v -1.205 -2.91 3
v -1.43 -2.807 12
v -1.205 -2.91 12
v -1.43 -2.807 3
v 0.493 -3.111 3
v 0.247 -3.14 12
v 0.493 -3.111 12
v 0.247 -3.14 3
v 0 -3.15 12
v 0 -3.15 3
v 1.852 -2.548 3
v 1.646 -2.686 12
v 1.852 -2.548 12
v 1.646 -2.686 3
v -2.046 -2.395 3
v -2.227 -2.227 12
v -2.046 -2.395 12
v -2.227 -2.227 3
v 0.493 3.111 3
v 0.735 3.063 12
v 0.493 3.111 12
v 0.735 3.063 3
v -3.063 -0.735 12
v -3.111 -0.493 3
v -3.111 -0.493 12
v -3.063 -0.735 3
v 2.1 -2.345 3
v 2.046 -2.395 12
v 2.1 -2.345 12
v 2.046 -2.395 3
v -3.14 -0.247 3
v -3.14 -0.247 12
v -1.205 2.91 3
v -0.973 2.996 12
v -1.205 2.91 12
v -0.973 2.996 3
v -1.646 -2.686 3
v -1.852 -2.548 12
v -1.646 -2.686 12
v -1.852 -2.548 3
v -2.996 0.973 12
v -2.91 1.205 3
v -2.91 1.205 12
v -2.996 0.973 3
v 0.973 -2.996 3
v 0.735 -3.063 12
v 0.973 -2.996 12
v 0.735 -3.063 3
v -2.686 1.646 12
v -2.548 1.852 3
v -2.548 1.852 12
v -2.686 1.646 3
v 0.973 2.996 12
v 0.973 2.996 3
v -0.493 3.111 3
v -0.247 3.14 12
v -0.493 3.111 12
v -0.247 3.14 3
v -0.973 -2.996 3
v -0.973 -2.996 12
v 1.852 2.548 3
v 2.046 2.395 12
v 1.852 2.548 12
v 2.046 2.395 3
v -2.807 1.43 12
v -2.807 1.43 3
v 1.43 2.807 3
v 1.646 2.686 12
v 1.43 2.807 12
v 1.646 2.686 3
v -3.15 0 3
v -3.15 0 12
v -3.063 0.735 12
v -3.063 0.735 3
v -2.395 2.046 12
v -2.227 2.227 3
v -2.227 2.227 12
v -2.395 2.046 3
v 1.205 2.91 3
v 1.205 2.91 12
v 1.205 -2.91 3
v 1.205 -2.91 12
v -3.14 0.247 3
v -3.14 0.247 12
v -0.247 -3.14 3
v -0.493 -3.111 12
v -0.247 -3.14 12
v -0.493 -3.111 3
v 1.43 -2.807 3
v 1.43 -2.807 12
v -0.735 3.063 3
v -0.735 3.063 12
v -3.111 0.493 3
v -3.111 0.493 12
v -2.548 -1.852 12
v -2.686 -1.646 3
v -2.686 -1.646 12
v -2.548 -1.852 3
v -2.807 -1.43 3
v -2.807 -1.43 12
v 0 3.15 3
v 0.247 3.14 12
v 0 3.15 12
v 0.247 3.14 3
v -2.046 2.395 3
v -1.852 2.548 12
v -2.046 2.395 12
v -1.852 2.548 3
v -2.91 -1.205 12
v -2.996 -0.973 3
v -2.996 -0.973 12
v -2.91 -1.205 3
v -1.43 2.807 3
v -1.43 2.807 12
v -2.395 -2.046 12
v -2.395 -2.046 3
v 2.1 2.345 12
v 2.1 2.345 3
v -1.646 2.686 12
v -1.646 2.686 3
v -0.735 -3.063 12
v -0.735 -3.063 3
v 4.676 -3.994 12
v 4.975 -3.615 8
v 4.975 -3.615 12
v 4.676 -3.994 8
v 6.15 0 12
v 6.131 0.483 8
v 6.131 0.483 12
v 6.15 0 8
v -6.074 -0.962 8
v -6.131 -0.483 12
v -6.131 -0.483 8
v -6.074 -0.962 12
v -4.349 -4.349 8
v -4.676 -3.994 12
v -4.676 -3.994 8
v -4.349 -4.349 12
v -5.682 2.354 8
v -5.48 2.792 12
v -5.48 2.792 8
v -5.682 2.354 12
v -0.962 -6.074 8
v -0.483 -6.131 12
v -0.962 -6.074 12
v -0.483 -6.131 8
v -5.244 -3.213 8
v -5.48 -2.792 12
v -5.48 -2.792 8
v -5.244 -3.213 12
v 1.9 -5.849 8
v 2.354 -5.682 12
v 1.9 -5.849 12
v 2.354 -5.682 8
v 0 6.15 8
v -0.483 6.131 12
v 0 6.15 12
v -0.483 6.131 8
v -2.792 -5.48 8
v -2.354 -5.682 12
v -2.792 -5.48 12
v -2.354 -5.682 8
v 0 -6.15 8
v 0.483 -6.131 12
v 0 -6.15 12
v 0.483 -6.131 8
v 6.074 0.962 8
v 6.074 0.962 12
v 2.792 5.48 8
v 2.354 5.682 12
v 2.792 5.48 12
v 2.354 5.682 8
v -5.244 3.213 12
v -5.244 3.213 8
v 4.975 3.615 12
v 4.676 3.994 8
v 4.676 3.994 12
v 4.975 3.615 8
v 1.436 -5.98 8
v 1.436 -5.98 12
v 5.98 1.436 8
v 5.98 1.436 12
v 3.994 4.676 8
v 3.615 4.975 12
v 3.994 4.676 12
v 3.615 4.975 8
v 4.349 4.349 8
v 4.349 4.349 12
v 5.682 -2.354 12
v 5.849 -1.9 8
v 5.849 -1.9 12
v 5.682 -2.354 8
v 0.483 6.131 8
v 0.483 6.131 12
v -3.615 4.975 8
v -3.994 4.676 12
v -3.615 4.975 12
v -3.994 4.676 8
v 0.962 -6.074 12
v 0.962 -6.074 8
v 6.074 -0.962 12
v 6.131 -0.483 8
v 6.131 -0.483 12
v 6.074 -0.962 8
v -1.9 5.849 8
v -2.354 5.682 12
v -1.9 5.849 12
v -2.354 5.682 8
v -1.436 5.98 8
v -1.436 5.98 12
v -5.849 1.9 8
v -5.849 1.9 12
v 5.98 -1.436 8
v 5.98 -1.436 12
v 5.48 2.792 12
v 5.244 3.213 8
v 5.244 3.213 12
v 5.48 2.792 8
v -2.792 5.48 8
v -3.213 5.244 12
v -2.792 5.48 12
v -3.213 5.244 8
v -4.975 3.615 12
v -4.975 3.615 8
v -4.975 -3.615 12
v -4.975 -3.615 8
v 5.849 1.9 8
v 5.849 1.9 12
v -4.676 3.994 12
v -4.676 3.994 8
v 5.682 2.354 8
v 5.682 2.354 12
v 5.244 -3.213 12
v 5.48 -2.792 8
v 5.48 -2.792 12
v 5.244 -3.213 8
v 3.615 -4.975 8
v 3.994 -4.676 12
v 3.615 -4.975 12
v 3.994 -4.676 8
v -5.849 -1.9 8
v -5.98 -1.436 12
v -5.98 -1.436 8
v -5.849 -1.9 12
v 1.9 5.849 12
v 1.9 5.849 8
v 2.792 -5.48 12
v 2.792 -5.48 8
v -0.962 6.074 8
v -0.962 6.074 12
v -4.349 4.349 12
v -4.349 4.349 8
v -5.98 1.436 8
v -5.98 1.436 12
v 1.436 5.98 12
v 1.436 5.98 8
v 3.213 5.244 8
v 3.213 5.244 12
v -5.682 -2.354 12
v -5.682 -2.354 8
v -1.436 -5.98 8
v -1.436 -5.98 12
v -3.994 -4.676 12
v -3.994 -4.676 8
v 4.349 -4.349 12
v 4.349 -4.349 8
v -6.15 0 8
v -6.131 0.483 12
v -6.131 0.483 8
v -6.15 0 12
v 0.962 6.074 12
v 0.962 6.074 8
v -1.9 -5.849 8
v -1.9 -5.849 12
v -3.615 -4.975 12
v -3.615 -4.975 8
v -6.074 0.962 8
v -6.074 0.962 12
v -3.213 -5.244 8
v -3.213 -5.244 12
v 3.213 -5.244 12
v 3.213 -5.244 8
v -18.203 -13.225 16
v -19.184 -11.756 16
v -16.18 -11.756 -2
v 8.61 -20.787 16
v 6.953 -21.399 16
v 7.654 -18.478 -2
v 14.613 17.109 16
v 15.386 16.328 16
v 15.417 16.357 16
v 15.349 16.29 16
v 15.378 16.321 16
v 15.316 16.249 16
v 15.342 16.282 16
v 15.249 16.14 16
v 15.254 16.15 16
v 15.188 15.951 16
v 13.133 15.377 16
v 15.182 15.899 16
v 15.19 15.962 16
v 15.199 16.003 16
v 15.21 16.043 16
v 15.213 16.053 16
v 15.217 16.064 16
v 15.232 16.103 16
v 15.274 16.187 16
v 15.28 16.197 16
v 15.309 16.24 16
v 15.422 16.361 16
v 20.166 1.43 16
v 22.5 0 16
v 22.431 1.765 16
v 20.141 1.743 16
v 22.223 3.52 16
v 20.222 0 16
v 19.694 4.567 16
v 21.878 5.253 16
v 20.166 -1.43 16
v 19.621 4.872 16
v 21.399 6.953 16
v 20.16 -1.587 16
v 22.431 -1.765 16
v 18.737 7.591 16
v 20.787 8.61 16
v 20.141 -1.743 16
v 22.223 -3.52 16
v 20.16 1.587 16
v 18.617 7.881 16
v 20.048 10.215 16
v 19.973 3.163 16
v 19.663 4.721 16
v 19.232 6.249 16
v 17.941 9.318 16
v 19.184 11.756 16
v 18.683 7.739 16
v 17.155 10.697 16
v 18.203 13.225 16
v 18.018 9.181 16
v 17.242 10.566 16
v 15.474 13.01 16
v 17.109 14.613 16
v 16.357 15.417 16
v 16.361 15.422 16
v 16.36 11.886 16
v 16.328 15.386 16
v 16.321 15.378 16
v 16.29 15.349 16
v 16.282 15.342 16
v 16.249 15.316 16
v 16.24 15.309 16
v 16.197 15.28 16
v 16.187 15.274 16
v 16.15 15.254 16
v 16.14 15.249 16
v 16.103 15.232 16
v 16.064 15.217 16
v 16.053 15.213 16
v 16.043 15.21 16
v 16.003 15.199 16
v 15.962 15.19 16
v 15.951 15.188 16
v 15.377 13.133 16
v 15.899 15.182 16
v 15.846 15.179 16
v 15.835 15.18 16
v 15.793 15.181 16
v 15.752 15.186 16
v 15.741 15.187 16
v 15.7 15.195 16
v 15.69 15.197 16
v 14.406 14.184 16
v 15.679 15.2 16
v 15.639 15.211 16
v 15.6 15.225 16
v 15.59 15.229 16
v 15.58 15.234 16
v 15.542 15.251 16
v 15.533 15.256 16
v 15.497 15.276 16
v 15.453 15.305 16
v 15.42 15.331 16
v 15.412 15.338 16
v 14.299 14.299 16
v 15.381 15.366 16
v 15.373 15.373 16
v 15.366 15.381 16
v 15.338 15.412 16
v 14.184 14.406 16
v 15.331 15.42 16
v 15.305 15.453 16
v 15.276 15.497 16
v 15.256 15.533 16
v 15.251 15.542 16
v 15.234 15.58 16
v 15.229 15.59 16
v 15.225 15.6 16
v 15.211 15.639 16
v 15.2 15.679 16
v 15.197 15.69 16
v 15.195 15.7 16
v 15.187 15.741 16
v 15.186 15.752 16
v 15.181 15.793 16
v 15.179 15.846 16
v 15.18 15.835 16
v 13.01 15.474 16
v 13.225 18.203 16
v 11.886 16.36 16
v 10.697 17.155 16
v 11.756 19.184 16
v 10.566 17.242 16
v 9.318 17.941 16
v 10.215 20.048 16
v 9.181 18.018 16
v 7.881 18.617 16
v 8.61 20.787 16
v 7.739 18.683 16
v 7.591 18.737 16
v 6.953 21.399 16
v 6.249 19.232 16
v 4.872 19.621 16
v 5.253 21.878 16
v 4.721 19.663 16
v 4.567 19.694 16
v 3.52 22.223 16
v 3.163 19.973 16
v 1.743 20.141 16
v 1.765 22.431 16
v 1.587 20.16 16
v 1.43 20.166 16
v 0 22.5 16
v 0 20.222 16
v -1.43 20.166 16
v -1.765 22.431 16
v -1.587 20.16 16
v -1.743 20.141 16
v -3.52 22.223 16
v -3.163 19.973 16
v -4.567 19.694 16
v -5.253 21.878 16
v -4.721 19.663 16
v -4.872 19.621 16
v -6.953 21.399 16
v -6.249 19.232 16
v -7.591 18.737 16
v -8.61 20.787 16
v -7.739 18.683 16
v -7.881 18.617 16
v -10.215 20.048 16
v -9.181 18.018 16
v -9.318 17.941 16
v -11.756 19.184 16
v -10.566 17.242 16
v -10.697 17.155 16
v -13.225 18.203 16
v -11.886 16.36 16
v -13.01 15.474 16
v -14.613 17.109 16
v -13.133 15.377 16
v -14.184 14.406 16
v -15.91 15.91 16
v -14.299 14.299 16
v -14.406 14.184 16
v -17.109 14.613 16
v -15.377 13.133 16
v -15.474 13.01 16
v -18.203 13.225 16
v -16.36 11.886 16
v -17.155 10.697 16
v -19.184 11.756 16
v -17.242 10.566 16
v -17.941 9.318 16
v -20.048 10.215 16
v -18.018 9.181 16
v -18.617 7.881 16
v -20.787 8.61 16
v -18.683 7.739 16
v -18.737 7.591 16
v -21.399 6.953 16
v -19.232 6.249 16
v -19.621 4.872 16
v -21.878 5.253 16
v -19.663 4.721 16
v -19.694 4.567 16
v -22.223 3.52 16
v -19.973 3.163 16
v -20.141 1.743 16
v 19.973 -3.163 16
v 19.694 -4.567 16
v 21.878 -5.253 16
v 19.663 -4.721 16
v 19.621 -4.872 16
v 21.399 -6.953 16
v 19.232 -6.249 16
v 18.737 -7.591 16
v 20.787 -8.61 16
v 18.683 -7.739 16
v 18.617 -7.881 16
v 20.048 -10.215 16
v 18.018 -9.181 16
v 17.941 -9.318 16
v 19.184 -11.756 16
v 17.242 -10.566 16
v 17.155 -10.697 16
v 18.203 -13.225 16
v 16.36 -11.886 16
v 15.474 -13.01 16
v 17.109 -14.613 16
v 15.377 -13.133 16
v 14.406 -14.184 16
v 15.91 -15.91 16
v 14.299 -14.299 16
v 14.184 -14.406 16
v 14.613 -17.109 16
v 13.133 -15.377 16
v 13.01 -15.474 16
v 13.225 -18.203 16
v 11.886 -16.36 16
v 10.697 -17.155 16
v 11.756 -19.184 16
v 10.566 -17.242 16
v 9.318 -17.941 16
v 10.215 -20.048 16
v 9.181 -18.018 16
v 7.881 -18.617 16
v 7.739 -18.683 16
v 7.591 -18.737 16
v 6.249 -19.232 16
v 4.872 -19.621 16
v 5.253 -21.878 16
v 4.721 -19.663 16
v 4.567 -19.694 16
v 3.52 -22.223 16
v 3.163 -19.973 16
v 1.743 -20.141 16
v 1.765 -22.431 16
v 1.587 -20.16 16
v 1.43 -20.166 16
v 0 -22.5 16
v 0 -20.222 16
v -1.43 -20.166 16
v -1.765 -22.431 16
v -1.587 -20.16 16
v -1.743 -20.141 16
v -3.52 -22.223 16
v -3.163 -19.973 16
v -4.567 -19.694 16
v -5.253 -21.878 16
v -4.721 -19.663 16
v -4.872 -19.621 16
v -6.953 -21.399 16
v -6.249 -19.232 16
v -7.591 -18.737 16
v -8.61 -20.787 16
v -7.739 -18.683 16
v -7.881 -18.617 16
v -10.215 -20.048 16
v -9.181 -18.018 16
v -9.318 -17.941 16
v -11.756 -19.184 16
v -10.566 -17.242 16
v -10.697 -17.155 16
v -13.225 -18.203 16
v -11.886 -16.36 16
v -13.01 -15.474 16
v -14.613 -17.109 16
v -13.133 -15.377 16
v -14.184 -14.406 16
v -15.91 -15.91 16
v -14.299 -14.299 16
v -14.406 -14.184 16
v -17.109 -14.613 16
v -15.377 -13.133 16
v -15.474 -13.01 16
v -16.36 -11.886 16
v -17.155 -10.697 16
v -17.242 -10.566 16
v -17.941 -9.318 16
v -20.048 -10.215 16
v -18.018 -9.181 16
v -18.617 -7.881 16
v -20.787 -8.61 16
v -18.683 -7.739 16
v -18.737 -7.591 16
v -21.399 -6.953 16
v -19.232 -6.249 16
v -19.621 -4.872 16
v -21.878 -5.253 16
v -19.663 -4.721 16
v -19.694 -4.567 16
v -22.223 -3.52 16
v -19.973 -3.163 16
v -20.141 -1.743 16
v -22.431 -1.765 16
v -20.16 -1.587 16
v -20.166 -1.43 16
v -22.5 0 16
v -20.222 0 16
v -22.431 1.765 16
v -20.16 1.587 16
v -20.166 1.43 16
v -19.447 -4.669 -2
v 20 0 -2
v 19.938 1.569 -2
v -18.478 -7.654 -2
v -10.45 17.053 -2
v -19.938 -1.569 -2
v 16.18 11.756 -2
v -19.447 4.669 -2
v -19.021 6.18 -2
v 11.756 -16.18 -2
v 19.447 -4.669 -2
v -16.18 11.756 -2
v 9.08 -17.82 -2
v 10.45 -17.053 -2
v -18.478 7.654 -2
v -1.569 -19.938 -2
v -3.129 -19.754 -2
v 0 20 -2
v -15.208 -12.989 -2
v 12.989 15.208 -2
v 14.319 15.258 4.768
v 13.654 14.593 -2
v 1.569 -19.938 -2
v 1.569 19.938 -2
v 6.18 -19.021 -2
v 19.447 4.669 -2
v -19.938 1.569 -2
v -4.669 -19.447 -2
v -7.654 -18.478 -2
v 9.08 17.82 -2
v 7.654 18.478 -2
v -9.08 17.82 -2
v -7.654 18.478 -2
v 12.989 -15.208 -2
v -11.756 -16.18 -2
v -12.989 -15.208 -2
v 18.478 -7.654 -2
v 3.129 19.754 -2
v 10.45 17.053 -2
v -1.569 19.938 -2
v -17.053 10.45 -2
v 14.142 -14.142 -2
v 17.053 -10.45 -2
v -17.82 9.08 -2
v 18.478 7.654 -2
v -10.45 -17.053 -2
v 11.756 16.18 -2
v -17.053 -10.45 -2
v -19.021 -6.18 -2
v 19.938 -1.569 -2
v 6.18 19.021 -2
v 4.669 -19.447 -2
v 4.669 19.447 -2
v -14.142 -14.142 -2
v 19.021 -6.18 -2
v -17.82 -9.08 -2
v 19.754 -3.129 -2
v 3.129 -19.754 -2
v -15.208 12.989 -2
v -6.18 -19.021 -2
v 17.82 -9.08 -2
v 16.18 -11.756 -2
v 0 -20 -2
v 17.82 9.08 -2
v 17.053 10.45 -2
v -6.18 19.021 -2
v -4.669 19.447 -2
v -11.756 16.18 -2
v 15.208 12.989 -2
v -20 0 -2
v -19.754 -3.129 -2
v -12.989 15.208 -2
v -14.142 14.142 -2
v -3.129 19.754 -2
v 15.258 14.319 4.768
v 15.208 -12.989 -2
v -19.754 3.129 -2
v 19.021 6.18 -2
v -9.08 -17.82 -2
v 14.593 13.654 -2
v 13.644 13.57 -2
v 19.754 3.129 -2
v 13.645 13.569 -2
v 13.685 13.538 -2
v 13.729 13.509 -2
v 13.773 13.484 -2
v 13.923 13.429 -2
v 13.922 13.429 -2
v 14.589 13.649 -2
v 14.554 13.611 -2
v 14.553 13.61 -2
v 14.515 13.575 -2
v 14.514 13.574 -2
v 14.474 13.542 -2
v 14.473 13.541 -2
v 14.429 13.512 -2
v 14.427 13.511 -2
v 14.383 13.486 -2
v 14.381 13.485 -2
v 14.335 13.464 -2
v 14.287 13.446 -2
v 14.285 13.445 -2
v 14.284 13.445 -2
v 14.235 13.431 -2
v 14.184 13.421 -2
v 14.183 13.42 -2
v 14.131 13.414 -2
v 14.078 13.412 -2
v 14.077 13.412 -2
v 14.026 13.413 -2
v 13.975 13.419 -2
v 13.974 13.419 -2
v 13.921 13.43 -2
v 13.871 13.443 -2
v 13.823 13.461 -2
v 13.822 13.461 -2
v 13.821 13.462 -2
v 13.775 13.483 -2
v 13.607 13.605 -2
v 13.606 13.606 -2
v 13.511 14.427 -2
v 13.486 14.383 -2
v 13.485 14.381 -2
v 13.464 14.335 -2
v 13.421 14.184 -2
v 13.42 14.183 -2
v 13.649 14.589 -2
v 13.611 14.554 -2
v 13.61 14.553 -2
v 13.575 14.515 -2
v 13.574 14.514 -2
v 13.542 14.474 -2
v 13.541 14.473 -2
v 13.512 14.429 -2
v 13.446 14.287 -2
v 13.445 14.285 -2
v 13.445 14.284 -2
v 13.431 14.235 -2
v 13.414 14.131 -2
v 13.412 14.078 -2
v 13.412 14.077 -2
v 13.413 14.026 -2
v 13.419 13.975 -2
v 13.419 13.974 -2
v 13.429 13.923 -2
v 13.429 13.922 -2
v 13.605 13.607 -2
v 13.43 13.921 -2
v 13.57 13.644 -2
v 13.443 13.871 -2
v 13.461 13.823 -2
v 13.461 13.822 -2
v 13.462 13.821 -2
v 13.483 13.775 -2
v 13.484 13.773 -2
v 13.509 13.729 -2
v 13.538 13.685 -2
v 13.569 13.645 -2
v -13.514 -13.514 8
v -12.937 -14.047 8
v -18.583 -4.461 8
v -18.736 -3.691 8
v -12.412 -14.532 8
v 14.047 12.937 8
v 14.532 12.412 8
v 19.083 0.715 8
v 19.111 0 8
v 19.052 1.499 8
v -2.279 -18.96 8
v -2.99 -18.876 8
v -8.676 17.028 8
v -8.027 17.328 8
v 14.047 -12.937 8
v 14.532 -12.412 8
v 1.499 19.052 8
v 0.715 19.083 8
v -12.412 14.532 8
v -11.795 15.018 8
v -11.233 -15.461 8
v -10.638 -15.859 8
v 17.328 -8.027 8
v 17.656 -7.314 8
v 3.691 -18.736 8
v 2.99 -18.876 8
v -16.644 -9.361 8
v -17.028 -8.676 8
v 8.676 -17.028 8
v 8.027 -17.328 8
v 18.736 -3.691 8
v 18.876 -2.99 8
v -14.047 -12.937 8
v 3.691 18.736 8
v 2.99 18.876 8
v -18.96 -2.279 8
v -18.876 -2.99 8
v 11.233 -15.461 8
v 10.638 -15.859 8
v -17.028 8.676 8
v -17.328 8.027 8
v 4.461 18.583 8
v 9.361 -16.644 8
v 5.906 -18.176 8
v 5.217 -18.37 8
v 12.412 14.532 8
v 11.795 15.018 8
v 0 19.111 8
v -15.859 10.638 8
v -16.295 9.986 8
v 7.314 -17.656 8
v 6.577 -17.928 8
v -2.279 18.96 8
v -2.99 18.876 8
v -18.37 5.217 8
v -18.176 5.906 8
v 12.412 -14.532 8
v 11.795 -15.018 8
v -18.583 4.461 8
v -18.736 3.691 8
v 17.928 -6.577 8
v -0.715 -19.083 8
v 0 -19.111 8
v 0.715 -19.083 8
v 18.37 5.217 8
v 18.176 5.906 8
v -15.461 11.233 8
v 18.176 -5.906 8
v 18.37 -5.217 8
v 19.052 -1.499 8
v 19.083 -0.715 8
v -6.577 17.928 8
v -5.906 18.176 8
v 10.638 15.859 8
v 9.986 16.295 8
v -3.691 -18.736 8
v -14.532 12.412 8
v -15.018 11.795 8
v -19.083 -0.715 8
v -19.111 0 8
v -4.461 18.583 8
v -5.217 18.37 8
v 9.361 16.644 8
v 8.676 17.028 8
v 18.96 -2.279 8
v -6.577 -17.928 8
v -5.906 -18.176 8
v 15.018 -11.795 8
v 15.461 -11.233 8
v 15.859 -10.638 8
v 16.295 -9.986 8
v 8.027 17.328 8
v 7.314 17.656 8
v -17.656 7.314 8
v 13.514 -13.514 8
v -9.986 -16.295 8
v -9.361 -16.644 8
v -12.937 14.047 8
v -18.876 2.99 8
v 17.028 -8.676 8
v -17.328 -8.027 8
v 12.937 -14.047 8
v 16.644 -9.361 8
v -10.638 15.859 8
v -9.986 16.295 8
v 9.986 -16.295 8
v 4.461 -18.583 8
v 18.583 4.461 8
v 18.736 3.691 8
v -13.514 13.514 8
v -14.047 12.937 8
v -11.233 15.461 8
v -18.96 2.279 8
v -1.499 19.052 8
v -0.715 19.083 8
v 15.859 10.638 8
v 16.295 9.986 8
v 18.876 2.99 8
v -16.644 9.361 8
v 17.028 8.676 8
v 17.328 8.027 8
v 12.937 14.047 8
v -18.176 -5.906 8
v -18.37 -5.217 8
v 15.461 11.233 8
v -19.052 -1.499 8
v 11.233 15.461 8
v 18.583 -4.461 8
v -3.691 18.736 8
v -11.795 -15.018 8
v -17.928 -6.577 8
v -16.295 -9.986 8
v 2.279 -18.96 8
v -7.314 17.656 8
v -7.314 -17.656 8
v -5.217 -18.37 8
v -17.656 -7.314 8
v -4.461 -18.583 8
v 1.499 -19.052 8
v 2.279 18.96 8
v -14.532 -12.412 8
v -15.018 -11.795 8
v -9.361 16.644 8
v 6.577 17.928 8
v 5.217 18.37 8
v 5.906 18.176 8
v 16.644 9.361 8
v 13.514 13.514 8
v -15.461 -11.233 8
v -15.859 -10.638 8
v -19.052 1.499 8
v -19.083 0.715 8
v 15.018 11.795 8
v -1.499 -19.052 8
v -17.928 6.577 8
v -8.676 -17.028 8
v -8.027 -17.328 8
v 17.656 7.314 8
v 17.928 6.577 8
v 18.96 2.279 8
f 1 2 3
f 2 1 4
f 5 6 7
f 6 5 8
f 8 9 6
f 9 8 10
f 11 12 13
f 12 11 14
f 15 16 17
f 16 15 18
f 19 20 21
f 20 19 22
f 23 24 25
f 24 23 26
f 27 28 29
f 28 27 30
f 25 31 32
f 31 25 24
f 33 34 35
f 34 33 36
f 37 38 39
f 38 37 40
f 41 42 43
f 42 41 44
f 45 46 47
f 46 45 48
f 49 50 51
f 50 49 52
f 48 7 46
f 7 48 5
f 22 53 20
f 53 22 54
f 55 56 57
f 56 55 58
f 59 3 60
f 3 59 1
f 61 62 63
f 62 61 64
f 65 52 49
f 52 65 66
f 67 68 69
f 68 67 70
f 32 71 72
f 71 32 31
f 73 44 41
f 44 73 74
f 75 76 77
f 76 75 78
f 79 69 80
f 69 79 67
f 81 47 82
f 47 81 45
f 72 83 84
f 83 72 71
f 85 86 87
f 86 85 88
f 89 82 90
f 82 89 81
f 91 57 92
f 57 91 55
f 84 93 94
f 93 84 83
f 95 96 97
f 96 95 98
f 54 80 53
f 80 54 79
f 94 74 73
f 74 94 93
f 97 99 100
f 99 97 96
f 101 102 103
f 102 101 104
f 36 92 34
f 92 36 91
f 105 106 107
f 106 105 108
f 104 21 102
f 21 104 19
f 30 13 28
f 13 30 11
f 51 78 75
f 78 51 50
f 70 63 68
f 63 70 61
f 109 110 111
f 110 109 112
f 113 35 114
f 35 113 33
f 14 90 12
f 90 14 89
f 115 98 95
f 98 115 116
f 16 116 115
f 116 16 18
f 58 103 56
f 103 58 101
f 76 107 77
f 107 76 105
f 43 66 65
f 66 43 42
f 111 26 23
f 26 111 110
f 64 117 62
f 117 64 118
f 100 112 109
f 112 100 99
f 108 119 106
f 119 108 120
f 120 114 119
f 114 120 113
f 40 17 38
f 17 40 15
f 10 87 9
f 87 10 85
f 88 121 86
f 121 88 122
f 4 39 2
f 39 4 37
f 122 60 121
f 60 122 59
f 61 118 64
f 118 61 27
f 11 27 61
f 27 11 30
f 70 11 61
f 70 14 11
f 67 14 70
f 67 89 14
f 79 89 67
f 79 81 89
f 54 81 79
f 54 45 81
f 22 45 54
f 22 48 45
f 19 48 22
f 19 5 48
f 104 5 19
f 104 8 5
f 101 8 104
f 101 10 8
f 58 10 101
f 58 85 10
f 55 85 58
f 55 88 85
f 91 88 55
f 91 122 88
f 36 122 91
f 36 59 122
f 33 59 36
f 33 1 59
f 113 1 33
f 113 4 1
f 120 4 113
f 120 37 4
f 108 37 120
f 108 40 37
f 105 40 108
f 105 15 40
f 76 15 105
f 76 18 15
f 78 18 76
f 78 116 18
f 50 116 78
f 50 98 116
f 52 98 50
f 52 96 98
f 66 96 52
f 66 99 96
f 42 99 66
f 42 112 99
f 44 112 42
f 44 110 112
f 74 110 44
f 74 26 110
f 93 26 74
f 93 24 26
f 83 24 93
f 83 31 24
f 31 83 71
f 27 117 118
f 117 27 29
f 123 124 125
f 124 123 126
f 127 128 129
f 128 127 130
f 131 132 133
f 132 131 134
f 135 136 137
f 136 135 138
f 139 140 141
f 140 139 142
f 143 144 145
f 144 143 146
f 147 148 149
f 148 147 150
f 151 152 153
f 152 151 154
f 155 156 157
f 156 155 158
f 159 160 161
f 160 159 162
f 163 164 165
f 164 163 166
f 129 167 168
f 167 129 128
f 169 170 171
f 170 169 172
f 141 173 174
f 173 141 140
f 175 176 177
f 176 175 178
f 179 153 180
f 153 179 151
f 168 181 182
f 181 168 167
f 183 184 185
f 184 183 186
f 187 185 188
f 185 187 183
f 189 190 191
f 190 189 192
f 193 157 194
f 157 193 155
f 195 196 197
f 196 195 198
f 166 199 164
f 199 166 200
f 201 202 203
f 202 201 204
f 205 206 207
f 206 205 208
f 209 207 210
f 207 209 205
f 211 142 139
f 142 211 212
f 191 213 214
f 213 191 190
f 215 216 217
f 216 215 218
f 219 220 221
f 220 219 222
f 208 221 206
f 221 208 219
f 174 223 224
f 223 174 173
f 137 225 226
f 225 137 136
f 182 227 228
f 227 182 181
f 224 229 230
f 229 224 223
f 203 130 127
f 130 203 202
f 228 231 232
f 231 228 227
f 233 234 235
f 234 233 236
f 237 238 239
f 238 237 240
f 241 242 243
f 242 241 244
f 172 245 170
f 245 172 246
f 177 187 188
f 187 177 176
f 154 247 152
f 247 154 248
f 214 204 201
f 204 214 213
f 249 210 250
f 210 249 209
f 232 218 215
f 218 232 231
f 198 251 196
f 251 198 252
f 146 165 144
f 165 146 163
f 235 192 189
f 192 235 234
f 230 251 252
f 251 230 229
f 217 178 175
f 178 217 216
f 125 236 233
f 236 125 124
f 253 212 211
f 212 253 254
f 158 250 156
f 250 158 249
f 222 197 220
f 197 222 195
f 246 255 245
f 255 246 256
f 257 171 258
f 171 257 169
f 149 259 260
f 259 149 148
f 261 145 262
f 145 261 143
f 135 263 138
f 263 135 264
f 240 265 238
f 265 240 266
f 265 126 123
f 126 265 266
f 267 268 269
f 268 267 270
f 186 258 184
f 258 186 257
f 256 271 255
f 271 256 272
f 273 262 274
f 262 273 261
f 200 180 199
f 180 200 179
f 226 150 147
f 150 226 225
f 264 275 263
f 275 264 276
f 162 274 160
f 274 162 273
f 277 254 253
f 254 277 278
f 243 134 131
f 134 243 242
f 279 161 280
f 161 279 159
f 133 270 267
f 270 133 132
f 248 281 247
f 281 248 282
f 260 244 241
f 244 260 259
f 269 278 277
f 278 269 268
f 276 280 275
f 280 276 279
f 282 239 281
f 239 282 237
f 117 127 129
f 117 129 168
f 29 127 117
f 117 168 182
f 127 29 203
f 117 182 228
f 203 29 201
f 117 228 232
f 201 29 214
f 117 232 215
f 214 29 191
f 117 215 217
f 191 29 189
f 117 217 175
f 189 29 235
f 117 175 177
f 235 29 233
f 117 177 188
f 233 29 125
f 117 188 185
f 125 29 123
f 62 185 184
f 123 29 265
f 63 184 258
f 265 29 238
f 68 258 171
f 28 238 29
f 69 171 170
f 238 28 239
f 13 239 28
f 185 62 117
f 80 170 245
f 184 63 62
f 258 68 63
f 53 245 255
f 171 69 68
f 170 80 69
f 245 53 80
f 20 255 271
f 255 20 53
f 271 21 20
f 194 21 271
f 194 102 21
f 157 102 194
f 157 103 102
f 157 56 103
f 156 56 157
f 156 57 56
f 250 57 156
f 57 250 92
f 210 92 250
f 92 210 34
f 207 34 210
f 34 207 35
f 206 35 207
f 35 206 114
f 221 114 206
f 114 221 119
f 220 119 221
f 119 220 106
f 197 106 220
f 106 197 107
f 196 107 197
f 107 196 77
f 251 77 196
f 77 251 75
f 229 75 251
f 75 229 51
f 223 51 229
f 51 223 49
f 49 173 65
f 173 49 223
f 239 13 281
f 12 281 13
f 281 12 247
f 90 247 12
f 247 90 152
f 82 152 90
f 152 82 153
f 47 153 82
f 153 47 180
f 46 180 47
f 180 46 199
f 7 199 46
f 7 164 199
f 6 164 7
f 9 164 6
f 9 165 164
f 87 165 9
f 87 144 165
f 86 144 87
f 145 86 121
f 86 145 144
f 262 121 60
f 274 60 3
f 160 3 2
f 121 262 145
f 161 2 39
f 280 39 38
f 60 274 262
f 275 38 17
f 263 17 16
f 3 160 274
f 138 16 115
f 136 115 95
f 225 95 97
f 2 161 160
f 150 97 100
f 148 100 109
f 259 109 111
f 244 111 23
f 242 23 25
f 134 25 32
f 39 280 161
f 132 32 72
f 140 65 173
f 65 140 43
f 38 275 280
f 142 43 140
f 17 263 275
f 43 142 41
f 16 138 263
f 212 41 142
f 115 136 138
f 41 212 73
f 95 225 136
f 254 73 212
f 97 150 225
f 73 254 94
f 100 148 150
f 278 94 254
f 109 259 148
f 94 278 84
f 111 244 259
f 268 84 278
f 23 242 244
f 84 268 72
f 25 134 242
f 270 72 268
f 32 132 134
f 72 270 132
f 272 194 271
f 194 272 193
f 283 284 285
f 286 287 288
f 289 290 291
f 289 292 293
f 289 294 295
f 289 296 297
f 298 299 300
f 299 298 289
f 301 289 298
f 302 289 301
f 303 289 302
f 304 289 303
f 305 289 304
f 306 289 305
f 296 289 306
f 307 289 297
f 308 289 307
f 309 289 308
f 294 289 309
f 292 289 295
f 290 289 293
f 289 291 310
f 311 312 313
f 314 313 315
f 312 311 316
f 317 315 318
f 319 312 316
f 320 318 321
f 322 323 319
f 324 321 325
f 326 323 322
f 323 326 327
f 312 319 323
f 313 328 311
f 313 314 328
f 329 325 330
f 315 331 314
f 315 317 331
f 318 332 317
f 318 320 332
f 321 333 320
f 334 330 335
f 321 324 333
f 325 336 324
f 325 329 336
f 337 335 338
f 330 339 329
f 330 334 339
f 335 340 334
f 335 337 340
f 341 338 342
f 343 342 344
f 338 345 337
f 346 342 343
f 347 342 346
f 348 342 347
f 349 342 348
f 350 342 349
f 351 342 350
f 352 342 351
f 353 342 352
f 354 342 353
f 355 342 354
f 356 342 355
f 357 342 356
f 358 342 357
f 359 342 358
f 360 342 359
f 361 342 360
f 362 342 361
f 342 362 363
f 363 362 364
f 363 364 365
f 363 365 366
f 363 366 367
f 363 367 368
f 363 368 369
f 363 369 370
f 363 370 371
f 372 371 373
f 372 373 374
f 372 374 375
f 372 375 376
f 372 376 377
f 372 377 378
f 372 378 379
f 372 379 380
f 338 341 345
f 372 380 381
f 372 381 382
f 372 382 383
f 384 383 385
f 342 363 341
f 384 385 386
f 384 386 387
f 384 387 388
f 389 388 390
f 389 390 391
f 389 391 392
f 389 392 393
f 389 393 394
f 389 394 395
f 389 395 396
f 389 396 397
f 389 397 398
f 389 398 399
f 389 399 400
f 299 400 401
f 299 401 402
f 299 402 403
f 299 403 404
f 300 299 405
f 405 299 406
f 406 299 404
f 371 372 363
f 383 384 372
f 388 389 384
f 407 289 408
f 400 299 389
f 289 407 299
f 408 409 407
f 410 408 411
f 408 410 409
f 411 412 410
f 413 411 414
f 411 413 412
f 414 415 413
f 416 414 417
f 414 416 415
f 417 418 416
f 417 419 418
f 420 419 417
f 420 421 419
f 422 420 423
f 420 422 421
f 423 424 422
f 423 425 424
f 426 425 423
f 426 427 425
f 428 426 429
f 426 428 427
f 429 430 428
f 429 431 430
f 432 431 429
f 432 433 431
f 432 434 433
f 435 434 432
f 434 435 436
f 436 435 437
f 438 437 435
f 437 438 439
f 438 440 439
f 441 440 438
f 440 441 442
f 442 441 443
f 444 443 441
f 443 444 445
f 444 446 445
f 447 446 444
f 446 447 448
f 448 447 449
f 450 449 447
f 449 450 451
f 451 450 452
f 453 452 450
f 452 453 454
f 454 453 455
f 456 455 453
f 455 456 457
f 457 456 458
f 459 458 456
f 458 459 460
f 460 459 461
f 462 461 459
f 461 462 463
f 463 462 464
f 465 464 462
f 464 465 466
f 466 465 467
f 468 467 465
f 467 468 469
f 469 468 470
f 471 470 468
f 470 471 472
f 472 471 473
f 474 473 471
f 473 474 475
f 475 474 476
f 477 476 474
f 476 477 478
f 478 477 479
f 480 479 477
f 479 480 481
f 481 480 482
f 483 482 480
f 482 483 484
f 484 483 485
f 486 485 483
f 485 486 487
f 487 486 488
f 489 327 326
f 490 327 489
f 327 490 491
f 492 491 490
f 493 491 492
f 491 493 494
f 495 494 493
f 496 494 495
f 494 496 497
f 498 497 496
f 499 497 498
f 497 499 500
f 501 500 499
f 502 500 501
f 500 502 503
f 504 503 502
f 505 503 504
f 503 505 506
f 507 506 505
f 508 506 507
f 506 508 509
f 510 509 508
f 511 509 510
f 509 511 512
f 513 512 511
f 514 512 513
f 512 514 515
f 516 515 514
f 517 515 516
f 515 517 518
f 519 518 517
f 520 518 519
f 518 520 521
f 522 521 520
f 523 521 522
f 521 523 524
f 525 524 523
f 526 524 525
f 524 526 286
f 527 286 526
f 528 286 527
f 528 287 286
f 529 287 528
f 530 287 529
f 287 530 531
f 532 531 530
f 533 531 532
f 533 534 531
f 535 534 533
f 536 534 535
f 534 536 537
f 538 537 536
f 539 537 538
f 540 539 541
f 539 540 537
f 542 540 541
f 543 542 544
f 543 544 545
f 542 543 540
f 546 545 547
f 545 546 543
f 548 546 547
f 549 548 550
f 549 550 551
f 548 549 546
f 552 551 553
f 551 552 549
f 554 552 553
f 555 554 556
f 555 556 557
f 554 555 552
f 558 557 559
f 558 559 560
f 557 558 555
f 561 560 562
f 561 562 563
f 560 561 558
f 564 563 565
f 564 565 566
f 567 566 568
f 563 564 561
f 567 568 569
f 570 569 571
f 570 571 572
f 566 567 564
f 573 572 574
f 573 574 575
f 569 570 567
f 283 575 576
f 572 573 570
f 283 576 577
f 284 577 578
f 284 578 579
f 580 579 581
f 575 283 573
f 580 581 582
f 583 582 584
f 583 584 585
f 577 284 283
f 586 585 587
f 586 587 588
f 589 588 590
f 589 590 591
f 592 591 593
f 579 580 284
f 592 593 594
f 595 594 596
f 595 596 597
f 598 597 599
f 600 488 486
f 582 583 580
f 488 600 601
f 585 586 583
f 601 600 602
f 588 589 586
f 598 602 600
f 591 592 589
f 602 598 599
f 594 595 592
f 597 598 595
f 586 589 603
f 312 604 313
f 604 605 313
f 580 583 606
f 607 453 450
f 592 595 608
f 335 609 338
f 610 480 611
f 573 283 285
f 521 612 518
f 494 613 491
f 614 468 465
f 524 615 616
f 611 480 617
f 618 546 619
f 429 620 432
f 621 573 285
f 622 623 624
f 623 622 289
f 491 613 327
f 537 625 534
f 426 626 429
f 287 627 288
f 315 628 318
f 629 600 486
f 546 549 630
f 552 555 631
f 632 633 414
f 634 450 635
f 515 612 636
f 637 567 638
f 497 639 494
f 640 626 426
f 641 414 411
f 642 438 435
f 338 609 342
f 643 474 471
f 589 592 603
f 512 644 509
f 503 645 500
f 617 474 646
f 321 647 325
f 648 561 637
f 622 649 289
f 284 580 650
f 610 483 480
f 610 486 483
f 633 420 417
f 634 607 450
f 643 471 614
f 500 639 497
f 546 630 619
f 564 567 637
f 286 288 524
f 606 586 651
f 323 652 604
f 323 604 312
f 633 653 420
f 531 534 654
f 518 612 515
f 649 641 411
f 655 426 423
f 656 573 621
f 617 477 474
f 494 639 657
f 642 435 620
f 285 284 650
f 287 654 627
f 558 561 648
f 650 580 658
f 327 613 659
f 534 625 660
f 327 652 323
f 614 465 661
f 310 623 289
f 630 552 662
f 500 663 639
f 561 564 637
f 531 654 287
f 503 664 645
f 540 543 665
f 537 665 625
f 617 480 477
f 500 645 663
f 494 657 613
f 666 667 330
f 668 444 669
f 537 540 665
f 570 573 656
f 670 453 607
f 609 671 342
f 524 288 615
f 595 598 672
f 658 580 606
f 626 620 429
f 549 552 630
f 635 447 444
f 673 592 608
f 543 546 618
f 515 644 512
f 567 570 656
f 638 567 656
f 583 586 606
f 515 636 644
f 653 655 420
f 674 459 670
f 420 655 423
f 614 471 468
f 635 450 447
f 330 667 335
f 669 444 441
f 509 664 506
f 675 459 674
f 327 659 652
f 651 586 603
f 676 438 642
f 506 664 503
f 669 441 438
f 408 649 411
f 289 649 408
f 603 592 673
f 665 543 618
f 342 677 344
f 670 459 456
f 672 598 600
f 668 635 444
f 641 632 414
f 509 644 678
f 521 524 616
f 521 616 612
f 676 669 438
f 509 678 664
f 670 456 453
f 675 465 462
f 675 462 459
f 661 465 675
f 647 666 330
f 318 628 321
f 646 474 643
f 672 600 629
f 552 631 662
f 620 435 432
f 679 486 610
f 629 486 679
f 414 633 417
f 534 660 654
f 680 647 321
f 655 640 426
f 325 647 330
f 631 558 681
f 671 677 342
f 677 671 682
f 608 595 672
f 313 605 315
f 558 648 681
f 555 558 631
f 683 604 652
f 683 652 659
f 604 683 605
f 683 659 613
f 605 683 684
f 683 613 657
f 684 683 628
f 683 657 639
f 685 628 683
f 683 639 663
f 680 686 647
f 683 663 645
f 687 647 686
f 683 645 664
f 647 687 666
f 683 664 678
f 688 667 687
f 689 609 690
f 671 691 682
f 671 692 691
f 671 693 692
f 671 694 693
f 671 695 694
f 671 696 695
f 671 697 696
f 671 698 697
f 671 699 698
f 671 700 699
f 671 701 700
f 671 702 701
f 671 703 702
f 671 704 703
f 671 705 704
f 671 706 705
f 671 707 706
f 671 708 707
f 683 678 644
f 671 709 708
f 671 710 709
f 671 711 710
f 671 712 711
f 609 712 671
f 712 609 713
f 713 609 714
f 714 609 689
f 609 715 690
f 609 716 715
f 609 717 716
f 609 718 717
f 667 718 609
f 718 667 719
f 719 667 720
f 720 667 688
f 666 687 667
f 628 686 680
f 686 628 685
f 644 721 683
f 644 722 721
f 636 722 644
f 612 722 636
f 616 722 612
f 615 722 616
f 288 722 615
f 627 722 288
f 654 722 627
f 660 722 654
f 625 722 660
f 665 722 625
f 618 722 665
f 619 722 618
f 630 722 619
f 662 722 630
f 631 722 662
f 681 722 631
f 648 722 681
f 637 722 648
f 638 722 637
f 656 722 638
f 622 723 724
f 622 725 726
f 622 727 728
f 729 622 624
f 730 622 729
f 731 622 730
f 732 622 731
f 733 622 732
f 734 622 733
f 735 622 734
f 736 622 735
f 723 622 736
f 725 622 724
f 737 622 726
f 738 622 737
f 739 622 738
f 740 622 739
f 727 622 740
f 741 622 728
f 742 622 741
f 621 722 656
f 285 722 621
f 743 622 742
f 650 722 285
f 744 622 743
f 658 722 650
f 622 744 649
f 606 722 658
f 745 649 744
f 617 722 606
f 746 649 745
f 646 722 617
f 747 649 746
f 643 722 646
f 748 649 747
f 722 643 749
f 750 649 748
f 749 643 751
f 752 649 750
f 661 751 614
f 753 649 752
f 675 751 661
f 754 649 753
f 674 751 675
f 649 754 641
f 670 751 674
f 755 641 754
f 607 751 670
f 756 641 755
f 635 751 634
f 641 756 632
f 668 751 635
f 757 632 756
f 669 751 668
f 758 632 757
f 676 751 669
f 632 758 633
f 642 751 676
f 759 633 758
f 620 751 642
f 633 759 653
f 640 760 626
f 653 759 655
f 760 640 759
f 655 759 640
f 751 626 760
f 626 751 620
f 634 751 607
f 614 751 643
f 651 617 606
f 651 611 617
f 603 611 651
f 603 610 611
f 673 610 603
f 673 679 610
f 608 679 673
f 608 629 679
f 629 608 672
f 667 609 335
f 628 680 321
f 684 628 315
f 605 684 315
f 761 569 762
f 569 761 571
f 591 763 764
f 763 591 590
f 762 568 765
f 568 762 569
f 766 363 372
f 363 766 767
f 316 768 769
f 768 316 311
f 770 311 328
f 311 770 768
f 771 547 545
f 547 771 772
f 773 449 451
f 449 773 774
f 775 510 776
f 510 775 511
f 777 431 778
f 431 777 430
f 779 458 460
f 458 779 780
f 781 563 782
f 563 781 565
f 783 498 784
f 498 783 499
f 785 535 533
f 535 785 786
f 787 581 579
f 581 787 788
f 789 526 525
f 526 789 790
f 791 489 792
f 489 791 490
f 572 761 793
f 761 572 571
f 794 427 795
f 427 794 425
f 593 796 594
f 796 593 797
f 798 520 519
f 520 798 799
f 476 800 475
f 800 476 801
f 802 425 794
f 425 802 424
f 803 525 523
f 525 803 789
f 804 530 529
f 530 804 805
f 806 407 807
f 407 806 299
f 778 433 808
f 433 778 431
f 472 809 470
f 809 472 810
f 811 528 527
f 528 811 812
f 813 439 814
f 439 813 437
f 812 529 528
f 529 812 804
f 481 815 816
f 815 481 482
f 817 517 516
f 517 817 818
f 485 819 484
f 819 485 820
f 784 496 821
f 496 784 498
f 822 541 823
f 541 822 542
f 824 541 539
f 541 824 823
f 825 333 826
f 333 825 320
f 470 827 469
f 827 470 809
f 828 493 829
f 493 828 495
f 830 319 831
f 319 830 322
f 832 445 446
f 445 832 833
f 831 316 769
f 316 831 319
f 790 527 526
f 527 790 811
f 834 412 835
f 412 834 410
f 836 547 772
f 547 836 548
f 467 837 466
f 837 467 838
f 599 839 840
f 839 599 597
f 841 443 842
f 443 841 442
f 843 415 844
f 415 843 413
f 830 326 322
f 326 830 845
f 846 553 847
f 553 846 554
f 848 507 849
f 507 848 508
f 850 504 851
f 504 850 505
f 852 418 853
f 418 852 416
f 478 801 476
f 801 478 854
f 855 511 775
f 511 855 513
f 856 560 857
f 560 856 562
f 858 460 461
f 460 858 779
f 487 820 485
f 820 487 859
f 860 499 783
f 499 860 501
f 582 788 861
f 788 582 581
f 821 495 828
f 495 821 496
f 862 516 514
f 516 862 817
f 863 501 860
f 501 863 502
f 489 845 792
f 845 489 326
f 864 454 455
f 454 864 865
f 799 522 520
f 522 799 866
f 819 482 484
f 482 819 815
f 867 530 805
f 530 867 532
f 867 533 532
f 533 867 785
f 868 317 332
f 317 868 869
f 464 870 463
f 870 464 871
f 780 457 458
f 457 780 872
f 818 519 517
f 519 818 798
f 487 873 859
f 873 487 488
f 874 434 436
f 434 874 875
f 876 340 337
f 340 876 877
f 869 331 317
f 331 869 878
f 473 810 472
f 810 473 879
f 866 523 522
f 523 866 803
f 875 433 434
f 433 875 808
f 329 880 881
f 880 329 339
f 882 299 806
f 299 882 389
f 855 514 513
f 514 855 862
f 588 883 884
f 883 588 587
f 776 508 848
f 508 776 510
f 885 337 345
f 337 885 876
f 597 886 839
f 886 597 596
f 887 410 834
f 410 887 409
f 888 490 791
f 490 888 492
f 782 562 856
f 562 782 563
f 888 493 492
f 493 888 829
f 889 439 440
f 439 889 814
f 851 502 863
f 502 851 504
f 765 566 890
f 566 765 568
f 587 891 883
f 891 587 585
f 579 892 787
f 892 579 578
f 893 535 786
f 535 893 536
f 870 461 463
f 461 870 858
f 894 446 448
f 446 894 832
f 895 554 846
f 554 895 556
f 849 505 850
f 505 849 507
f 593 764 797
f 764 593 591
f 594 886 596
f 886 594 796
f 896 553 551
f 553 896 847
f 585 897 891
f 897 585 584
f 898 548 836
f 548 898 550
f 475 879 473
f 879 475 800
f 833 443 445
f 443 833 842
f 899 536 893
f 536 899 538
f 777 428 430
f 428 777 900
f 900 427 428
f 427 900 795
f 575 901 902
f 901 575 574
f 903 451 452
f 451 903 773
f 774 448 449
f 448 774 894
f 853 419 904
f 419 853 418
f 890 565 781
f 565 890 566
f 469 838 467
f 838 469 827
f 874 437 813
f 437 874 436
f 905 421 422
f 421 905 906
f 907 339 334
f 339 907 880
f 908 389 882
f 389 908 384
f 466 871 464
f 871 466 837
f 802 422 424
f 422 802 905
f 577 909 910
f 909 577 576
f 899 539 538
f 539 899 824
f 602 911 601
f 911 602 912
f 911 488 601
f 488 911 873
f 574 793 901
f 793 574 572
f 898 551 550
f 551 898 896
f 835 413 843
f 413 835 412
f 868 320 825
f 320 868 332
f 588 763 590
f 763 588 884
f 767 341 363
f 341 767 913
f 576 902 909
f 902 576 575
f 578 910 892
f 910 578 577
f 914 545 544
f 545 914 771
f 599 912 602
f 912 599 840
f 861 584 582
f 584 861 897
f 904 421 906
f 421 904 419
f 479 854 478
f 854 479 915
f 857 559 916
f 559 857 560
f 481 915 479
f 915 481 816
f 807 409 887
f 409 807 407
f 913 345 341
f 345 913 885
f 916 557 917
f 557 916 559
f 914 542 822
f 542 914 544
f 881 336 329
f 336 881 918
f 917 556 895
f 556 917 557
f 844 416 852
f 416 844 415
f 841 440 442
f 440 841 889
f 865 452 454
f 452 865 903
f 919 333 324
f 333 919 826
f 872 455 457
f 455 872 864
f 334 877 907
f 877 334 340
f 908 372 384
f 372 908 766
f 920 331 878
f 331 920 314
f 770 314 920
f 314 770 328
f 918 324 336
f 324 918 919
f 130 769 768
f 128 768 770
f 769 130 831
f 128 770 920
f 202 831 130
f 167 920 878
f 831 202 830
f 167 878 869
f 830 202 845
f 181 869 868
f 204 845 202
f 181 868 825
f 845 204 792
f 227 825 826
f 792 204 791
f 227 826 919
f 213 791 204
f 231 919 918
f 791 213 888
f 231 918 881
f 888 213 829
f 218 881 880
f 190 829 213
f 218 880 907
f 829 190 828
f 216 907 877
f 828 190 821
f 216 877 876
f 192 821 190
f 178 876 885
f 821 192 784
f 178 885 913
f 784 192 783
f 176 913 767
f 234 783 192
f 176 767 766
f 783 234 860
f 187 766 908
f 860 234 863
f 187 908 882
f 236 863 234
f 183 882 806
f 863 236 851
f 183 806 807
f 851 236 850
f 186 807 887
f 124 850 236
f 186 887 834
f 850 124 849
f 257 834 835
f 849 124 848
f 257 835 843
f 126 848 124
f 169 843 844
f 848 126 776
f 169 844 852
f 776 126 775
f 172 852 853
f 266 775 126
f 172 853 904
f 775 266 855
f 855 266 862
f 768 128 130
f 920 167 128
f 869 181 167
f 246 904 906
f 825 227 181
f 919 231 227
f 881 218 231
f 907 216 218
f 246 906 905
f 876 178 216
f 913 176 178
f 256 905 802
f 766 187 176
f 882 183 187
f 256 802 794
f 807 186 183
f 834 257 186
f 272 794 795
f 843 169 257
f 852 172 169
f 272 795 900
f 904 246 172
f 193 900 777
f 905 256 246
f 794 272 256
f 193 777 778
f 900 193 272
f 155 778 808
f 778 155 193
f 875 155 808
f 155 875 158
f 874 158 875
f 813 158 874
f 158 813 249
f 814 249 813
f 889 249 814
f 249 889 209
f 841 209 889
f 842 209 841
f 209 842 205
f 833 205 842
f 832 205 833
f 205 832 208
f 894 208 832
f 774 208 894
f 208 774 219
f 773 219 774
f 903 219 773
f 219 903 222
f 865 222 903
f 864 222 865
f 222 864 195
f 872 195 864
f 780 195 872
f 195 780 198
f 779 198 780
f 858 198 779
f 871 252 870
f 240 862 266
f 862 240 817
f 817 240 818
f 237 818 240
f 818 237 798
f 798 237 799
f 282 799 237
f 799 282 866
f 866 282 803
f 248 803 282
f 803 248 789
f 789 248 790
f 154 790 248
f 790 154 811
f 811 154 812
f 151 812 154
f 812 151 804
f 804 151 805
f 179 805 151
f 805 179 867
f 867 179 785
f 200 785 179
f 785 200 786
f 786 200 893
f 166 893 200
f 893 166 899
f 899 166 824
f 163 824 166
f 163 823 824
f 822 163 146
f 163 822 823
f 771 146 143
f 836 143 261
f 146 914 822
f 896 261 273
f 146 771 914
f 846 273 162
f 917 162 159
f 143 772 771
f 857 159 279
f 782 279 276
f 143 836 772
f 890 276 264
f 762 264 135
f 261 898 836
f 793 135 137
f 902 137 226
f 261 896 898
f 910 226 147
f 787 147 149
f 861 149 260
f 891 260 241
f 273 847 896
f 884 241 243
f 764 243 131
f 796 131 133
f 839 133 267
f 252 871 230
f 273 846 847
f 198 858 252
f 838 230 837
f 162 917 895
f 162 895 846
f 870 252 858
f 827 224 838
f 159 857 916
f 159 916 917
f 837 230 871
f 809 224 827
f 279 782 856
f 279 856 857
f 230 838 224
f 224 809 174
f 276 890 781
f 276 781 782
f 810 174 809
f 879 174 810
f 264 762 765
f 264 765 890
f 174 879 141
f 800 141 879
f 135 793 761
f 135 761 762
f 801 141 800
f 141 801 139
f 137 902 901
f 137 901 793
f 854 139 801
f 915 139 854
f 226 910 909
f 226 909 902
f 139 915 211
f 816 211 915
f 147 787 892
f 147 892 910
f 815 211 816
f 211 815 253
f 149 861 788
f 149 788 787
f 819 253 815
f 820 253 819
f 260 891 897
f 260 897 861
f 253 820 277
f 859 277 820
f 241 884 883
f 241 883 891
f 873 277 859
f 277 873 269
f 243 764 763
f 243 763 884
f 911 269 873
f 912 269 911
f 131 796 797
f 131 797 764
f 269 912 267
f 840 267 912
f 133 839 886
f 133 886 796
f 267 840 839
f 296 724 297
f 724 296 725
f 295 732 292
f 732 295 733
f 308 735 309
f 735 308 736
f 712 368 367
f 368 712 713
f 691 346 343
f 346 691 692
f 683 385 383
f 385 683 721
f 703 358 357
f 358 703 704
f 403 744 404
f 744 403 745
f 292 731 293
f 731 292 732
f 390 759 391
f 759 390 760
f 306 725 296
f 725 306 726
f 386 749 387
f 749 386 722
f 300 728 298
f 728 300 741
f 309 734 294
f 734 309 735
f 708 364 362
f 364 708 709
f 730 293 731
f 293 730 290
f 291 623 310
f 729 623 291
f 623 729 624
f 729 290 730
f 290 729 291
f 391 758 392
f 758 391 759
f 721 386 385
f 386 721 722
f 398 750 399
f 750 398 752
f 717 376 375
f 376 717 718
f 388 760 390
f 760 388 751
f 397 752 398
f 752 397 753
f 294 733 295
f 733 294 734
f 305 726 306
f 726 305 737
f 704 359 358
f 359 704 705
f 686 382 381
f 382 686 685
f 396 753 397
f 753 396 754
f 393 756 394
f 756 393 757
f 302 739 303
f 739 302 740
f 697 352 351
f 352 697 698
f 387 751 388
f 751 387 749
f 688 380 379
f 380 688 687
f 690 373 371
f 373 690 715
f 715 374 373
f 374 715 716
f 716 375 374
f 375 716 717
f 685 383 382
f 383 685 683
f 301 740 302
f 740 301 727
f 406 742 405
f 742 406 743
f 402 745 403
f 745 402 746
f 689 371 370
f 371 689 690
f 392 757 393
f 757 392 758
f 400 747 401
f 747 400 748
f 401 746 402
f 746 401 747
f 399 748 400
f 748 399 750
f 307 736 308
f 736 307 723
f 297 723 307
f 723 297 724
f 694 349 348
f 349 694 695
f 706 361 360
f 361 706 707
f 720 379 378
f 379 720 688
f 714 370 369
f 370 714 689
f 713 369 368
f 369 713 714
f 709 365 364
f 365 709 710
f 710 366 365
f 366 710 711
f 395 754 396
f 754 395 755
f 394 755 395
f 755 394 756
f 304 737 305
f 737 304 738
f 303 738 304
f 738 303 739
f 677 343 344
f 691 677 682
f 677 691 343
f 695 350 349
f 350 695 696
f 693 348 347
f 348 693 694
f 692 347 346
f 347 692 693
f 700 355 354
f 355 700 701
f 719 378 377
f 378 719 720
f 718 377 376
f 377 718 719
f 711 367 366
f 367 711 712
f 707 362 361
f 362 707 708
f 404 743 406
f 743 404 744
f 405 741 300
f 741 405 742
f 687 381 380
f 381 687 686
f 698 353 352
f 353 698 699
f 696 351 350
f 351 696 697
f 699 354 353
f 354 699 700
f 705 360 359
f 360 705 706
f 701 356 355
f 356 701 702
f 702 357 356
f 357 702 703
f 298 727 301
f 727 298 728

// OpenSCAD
/* [About the shaft] */
// How much of the shaft you want to pick
shaftHeight = 9; // [5:20]

// The shaft diameter
shaftDiameter = 6.3; // [3:0.1:8]

// A thickness for the shaft column
shaftColumnThickness=3; // [1:0.2:20]

// A thickness for the bottom of the shaft column
shaftColumnBottomThickness=3; // [1:0.1:20]

/* [About the knob itself] */
// This is the knob height
shieldHeight = 18; // [0:0.1:50]

// This is the knob diameter in the outher side of it
shieldRadiousFace = 40/2; // [8:0.2:50]

// This is the knobs base diameter
shieldRadiousBase=45/2; // [8:0.2:50]

// The thickness for the frontal side of the knob
faceThickness = 2; // [0:0.1:10]

reinforcement = true;
reinforcementHeight = 10; // [0:0.1:50]

dialAngle = 45; // [0:1:360]


$fn=80;

module knob(
    shaftHeight=9,
    shaftDiameter=6.3,
    shaftColumnThickness=3,
    shaftColumnBottomThickness=3,
    shieldHeight = 18,
    shieldRadiousFace = 40/2,
    shieldRadiousBase=45/2,
    faceThickness = 2,
    reinforcementHeight = 10,
    dialAngle = 45)
{
    module knotch(
    Height=9,
    Diameter=6.3,
    facetDiameter = 4.2)
    {
        $var1= 0;
        translate([Diameter/2+(Diameter-facetDiameter),0,0]) 
        {cube([Diameter,Height,Height*2.01], center = true);}
    }
    module shaft(
        Height=9,
        Diameter=6.3)
    {   
        difference(){
            cylinder(h = Height*1.02, r =Diameter/2);
            knotch(Height=Height*1.02, Diameter=Diameter, facetDiameter = 4.2);
        }

    }
    module shaftColumn(
        shaftHeight=9,
        shaftDiameter=6.3,
        wallThickness=3,
        bottomThickness=3)
    {

        difference(){
            cylinder(   h = (shaftHeight + bottomThickness),
                        r =(shaftDiameter+wallThickness*2)/2
            );
            translate([0,0,bottomThickness]){
            shaft(Height = shaftHeight, Diameter = shaftDiameter);
            }
        }    
    }

    // I am passing the parameters to internal modules implicitly with local variables
    // Depends on the shaft diameter to extract it from the reinforcement
    module knobShield(
        height = 18,
        radiousFace = 40/2,
        radiousBase=45/2,
        faceThickness = 2,
        reinforcementHeight =1
        )
    {
        module externalSurface(){
                translate([0,0, height/2-faceThickness]){
            cylinder(
                    h = height, 
                    r1 = radiousFace, 
                    r2 = radiousBase, 
                    center =true);
        }}
        module internalSurface(){
            translate([0,0, height/2]){
            cylinder(
                    h = height, 
                    r1 = radiousFace-faceThickness, 
                    r2 = radiousBase-faceThickness, 
                    center =true);
    }}
        module reinforcement(
            height = reinforcementHeight,
            radiousFace = 40/2,
            radiousBase=45/2,
            faceThickness = 2 )
        {
            translate([0,0, height/2-faceThickness]){
            
                difference(){
                    cylinder(
                    h = reinforcementHeight, 
                    r1 = radiousFace-faceThickness, 
                    r2 = radiousBase-faceThickness, 
                    center =true);                    
                    shaft(Height = 50, Diameter = shaftDiameter);
                }

            }
        }
    
        module dial(angle = 0)
        {
            rotate(a= [0,atan((shieldRadiousBase-shieldRadiousFace)/shieldHeight),angle])
            {
                translate([shieldRadiousFace, 0, - faceThickness])
                {
                    cylinder(h =100,r=faceThickness/3);
                    }
                }
        }
        difference()
        {
            union()
            {
                difference()
                {
                    externalSurface();
                    internalSurface();
                    
                }
                reinforcement();
                
            }   
            dial(angle = dialAngle);
        }

    }

    union(){
    
        shaftColumn(
            shaftHeight=shaftHeight,
            shaftDiameter=shaftDiameter,
            wallThickness=shaftColumnThickness,
            bottomThickness=shaftColumnBottomThickness
            );
        knobShield(
            height = shieldHeight,
            radiousFace = shieldRadiousFace,
            radiousBase= shieldRadiousBase,
            faceThickness = faceThickness,
            reinforcementHeight = reinforcementHeight
            );
    }
     
}

// The whole thing
knob(
    shaftHeight = shaftHeight,
    shaftDiameter = shaftDiameter,
    shaftColumnThickness = shaftColumnThickness,
    shaftColumnBottomThickness = shaftColumnBottomThickness,
    shieldHeight = shieldHeight ,
    shieldRadiousFace = shieldRadiousFace,
    shieldRadiousBase = shieldRadiousBase,
    faceThickness = faceThickness,
    reinforcementHeight = reinforcementHeight,
    dialAngle = dialAngle
    );


 
 
 
